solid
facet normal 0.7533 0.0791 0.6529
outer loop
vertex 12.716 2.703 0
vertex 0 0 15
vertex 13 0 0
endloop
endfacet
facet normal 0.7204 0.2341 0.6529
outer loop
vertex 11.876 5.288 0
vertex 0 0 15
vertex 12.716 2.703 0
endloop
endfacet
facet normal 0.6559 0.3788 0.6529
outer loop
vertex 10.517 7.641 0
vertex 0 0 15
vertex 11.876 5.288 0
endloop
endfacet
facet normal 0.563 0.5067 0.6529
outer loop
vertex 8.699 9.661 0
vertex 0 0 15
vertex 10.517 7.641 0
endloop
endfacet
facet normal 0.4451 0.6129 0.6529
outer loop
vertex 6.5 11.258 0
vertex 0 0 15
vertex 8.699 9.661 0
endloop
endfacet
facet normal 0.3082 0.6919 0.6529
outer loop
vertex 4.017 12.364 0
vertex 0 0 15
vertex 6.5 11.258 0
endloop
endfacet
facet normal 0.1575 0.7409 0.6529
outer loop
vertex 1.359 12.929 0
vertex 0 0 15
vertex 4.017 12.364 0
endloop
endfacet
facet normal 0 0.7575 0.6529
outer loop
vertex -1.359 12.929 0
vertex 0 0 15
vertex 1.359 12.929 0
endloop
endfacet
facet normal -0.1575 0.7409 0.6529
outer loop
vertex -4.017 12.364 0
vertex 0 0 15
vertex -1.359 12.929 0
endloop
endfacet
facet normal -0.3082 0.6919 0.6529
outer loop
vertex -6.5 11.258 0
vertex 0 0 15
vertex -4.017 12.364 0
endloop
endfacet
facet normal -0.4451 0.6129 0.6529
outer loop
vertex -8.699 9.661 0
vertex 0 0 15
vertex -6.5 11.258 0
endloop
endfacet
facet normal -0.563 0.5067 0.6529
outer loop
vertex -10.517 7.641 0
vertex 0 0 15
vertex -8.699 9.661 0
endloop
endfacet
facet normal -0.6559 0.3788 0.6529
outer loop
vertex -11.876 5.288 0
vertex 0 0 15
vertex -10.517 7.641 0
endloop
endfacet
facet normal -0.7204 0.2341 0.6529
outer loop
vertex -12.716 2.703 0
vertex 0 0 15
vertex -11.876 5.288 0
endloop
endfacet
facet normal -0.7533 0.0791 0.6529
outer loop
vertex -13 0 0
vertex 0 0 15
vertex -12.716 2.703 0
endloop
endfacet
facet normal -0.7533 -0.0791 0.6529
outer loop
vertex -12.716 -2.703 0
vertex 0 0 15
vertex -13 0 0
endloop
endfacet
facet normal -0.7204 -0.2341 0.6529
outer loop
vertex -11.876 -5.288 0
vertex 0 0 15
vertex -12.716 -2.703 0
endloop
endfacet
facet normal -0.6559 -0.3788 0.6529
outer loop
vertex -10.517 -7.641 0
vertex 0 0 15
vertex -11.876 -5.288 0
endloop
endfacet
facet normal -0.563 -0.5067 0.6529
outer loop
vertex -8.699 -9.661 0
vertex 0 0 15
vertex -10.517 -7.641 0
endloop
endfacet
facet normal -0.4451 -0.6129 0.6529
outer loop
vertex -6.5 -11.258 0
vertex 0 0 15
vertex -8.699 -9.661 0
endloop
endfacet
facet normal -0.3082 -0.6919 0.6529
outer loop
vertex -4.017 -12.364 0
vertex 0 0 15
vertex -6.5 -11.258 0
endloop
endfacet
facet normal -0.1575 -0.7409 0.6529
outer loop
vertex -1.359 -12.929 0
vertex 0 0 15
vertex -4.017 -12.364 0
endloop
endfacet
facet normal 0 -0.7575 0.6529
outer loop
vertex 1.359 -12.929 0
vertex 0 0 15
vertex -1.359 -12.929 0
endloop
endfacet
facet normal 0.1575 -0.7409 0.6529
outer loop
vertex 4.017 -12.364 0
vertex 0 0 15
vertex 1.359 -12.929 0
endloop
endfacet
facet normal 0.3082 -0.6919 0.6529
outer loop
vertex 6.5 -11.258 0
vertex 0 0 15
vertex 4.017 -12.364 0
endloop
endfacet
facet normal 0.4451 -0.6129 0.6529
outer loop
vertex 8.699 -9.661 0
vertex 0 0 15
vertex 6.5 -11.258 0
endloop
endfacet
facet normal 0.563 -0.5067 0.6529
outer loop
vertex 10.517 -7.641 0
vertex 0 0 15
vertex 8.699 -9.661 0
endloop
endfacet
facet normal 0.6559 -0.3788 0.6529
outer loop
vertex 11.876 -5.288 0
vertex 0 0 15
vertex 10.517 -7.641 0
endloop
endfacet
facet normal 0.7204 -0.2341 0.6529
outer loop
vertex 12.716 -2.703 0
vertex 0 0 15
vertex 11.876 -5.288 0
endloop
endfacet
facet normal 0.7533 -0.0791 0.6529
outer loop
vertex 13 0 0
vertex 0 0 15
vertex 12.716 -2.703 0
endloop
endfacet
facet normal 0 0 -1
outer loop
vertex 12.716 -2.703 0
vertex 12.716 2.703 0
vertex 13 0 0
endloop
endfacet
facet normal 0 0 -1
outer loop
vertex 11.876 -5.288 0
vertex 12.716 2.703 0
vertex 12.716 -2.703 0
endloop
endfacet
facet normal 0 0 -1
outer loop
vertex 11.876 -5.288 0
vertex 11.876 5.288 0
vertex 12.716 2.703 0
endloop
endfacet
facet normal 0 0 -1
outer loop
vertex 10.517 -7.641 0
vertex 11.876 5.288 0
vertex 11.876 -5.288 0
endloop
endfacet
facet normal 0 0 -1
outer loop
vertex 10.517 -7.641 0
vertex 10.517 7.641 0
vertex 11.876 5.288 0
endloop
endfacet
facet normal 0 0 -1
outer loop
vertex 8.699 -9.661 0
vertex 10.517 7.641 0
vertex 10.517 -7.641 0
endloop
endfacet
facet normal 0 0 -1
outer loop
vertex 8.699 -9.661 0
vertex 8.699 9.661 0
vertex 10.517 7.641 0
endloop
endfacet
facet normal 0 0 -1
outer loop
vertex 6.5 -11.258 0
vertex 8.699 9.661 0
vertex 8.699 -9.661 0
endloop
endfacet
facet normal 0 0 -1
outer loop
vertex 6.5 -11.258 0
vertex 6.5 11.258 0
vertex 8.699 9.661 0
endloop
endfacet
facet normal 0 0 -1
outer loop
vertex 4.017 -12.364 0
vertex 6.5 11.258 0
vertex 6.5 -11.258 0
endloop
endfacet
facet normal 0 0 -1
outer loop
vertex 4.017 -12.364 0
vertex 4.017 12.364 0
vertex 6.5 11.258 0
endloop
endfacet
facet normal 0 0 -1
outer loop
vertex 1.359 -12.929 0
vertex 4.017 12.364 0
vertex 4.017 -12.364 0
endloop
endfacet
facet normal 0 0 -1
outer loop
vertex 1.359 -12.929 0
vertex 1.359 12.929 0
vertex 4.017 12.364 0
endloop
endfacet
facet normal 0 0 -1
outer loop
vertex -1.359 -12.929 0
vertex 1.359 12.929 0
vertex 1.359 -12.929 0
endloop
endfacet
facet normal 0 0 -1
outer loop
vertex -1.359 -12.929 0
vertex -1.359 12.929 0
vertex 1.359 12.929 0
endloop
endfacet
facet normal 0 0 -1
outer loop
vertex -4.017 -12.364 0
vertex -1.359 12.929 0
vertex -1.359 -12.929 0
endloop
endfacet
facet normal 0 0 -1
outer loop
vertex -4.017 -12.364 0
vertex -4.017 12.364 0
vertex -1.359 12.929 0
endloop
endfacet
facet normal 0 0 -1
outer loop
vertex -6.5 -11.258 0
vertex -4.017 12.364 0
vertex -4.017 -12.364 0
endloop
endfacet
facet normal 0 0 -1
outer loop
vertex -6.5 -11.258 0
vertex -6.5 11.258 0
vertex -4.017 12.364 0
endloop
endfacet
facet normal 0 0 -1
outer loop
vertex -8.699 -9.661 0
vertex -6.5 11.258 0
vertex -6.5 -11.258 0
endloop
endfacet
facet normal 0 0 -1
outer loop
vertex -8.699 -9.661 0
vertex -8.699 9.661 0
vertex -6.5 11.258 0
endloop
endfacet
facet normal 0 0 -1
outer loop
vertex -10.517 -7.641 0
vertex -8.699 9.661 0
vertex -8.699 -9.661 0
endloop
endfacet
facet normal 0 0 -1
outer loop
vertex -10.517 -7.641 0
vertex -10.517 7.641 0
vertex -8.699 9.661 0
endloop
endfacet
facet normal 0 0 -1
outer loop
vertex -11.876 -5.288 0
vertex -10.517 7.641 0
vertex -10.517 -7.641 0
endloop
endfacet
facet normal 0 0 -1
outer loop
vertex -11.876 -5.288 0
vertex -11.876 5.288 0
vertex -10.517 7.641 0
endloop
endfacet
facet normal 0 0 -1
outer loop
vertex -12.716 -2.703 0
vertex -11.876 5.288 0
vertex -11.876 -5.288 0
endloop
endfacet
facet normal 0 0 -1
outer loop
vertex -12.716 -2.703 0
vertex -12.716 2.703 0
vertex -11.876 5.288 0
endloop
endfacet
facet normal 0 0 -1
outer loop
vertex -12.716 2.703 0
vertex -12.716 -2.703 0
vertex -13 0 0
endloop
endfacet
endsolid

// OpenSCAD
// Generated by SolidPython 1.0.1 on 2020-07-29 00:46:43


cylinder(h = 15, r1 = 13, r2 = 0);
/***********************************************
*********      SolidPython code:      **********
************************************************
 
# import packages: SolidPython
from solid import *
from solid.utils import *
from itertools import chain, combinations, permutations


class Resize:

    def __init__(self, scad_file):
        self.scad_file = scad_file
        #self.scad_file = import_scad(scad_file)
        # cone/cylinder param:
        self.r1 = 0
        self.r2 = 0
        self.h = 0
        # rectangular prism param:
        self.w = 0
        self.l = 0
        # ellipse param:
        self.r = 0

    # import OpenScad code (file name corresponds to shape)


    # classify shape + parameters
    def assign(self, param1, param2, param3):
        if self.scad_file == 'cone.scad':
            self.r1 = param1
            self.r2 = param2
            self.h = param3
        elif self.scad_file == 'cylinder.scad':
            self.r1 = param1
            self.r2 = param2
            self.h = param3
        elif self.scad_file == 'rectangularPrism.scad':
            self.h = param1
            self.l = param2
            self.w = param3
        else:
            self.r = param1
            self.h = param2

    # resize parameters
    def iterate(self):
        x = range(3, 20, 2)
        i = 1
        if self.scad_file == 'cone.scad':
            tempList = list(permutations(x, 2))
            for temp in tempList:
                param1 = temp[0]
                param2 = temp[1]
                filepath = 'produced_scad_files/' + 'cone' + str(param1) + '_' + str(param2) + '_' + '.scad'
                scad_render_to_file(cylinder(h=param1, r1=param2, r2=0), filepath)

        elif self.scad_file == 'cylinder.scad':
            tempList = list(permutations(x, 3))
            for temp in tempList:
                param1 = temp[0]
                param2 = temp[1]
                filepath = 'produced_scad_files/' + 'cylinder' + str(param1) + '_' + str(param2) + '_' + '.scad'
                scad_render_to_file(cylinder(h=param1, r1=param2, r2=param2), filepath)

        elif self.scad_file == 'rectangularPrism.scad':
            tempList = list(permutations(x, 3))
            for temp in tempList:
                param1 = temp[0]
                param2 = temp[1]
                param3 = temp[2]
                filepath = 'produced_scad_files/' + 'rectangularPrism' + str(param1) + '_' + str(param2) + '_' + str(
                    param3) + '.scad'
                scad_render_to_file(cube(size=(param1, param2, param3)), filepath)

        elif self.scad_file == 'ellipse.scad':
            tempList = list(permutations(x, 4))
            for temp in tempList:
                param1 = temp[0]
                param2 = temp[1]
                param3 = temp[2]
                param4 = temp[3]
                filepath = 'produced_scad_files/' + 'ellipse' + str(param1) + '_' + str(param2) + '_' + str(param3) + '_' + str(param4) + '.scad'
                scad_render_to_file(scale([param1, param2, param3])(sphere(r=param4)), filepath)

    def render_to_scadfile(self):
        scad_render_to_file(scad, 'example.scad') 
 
************************************************/
